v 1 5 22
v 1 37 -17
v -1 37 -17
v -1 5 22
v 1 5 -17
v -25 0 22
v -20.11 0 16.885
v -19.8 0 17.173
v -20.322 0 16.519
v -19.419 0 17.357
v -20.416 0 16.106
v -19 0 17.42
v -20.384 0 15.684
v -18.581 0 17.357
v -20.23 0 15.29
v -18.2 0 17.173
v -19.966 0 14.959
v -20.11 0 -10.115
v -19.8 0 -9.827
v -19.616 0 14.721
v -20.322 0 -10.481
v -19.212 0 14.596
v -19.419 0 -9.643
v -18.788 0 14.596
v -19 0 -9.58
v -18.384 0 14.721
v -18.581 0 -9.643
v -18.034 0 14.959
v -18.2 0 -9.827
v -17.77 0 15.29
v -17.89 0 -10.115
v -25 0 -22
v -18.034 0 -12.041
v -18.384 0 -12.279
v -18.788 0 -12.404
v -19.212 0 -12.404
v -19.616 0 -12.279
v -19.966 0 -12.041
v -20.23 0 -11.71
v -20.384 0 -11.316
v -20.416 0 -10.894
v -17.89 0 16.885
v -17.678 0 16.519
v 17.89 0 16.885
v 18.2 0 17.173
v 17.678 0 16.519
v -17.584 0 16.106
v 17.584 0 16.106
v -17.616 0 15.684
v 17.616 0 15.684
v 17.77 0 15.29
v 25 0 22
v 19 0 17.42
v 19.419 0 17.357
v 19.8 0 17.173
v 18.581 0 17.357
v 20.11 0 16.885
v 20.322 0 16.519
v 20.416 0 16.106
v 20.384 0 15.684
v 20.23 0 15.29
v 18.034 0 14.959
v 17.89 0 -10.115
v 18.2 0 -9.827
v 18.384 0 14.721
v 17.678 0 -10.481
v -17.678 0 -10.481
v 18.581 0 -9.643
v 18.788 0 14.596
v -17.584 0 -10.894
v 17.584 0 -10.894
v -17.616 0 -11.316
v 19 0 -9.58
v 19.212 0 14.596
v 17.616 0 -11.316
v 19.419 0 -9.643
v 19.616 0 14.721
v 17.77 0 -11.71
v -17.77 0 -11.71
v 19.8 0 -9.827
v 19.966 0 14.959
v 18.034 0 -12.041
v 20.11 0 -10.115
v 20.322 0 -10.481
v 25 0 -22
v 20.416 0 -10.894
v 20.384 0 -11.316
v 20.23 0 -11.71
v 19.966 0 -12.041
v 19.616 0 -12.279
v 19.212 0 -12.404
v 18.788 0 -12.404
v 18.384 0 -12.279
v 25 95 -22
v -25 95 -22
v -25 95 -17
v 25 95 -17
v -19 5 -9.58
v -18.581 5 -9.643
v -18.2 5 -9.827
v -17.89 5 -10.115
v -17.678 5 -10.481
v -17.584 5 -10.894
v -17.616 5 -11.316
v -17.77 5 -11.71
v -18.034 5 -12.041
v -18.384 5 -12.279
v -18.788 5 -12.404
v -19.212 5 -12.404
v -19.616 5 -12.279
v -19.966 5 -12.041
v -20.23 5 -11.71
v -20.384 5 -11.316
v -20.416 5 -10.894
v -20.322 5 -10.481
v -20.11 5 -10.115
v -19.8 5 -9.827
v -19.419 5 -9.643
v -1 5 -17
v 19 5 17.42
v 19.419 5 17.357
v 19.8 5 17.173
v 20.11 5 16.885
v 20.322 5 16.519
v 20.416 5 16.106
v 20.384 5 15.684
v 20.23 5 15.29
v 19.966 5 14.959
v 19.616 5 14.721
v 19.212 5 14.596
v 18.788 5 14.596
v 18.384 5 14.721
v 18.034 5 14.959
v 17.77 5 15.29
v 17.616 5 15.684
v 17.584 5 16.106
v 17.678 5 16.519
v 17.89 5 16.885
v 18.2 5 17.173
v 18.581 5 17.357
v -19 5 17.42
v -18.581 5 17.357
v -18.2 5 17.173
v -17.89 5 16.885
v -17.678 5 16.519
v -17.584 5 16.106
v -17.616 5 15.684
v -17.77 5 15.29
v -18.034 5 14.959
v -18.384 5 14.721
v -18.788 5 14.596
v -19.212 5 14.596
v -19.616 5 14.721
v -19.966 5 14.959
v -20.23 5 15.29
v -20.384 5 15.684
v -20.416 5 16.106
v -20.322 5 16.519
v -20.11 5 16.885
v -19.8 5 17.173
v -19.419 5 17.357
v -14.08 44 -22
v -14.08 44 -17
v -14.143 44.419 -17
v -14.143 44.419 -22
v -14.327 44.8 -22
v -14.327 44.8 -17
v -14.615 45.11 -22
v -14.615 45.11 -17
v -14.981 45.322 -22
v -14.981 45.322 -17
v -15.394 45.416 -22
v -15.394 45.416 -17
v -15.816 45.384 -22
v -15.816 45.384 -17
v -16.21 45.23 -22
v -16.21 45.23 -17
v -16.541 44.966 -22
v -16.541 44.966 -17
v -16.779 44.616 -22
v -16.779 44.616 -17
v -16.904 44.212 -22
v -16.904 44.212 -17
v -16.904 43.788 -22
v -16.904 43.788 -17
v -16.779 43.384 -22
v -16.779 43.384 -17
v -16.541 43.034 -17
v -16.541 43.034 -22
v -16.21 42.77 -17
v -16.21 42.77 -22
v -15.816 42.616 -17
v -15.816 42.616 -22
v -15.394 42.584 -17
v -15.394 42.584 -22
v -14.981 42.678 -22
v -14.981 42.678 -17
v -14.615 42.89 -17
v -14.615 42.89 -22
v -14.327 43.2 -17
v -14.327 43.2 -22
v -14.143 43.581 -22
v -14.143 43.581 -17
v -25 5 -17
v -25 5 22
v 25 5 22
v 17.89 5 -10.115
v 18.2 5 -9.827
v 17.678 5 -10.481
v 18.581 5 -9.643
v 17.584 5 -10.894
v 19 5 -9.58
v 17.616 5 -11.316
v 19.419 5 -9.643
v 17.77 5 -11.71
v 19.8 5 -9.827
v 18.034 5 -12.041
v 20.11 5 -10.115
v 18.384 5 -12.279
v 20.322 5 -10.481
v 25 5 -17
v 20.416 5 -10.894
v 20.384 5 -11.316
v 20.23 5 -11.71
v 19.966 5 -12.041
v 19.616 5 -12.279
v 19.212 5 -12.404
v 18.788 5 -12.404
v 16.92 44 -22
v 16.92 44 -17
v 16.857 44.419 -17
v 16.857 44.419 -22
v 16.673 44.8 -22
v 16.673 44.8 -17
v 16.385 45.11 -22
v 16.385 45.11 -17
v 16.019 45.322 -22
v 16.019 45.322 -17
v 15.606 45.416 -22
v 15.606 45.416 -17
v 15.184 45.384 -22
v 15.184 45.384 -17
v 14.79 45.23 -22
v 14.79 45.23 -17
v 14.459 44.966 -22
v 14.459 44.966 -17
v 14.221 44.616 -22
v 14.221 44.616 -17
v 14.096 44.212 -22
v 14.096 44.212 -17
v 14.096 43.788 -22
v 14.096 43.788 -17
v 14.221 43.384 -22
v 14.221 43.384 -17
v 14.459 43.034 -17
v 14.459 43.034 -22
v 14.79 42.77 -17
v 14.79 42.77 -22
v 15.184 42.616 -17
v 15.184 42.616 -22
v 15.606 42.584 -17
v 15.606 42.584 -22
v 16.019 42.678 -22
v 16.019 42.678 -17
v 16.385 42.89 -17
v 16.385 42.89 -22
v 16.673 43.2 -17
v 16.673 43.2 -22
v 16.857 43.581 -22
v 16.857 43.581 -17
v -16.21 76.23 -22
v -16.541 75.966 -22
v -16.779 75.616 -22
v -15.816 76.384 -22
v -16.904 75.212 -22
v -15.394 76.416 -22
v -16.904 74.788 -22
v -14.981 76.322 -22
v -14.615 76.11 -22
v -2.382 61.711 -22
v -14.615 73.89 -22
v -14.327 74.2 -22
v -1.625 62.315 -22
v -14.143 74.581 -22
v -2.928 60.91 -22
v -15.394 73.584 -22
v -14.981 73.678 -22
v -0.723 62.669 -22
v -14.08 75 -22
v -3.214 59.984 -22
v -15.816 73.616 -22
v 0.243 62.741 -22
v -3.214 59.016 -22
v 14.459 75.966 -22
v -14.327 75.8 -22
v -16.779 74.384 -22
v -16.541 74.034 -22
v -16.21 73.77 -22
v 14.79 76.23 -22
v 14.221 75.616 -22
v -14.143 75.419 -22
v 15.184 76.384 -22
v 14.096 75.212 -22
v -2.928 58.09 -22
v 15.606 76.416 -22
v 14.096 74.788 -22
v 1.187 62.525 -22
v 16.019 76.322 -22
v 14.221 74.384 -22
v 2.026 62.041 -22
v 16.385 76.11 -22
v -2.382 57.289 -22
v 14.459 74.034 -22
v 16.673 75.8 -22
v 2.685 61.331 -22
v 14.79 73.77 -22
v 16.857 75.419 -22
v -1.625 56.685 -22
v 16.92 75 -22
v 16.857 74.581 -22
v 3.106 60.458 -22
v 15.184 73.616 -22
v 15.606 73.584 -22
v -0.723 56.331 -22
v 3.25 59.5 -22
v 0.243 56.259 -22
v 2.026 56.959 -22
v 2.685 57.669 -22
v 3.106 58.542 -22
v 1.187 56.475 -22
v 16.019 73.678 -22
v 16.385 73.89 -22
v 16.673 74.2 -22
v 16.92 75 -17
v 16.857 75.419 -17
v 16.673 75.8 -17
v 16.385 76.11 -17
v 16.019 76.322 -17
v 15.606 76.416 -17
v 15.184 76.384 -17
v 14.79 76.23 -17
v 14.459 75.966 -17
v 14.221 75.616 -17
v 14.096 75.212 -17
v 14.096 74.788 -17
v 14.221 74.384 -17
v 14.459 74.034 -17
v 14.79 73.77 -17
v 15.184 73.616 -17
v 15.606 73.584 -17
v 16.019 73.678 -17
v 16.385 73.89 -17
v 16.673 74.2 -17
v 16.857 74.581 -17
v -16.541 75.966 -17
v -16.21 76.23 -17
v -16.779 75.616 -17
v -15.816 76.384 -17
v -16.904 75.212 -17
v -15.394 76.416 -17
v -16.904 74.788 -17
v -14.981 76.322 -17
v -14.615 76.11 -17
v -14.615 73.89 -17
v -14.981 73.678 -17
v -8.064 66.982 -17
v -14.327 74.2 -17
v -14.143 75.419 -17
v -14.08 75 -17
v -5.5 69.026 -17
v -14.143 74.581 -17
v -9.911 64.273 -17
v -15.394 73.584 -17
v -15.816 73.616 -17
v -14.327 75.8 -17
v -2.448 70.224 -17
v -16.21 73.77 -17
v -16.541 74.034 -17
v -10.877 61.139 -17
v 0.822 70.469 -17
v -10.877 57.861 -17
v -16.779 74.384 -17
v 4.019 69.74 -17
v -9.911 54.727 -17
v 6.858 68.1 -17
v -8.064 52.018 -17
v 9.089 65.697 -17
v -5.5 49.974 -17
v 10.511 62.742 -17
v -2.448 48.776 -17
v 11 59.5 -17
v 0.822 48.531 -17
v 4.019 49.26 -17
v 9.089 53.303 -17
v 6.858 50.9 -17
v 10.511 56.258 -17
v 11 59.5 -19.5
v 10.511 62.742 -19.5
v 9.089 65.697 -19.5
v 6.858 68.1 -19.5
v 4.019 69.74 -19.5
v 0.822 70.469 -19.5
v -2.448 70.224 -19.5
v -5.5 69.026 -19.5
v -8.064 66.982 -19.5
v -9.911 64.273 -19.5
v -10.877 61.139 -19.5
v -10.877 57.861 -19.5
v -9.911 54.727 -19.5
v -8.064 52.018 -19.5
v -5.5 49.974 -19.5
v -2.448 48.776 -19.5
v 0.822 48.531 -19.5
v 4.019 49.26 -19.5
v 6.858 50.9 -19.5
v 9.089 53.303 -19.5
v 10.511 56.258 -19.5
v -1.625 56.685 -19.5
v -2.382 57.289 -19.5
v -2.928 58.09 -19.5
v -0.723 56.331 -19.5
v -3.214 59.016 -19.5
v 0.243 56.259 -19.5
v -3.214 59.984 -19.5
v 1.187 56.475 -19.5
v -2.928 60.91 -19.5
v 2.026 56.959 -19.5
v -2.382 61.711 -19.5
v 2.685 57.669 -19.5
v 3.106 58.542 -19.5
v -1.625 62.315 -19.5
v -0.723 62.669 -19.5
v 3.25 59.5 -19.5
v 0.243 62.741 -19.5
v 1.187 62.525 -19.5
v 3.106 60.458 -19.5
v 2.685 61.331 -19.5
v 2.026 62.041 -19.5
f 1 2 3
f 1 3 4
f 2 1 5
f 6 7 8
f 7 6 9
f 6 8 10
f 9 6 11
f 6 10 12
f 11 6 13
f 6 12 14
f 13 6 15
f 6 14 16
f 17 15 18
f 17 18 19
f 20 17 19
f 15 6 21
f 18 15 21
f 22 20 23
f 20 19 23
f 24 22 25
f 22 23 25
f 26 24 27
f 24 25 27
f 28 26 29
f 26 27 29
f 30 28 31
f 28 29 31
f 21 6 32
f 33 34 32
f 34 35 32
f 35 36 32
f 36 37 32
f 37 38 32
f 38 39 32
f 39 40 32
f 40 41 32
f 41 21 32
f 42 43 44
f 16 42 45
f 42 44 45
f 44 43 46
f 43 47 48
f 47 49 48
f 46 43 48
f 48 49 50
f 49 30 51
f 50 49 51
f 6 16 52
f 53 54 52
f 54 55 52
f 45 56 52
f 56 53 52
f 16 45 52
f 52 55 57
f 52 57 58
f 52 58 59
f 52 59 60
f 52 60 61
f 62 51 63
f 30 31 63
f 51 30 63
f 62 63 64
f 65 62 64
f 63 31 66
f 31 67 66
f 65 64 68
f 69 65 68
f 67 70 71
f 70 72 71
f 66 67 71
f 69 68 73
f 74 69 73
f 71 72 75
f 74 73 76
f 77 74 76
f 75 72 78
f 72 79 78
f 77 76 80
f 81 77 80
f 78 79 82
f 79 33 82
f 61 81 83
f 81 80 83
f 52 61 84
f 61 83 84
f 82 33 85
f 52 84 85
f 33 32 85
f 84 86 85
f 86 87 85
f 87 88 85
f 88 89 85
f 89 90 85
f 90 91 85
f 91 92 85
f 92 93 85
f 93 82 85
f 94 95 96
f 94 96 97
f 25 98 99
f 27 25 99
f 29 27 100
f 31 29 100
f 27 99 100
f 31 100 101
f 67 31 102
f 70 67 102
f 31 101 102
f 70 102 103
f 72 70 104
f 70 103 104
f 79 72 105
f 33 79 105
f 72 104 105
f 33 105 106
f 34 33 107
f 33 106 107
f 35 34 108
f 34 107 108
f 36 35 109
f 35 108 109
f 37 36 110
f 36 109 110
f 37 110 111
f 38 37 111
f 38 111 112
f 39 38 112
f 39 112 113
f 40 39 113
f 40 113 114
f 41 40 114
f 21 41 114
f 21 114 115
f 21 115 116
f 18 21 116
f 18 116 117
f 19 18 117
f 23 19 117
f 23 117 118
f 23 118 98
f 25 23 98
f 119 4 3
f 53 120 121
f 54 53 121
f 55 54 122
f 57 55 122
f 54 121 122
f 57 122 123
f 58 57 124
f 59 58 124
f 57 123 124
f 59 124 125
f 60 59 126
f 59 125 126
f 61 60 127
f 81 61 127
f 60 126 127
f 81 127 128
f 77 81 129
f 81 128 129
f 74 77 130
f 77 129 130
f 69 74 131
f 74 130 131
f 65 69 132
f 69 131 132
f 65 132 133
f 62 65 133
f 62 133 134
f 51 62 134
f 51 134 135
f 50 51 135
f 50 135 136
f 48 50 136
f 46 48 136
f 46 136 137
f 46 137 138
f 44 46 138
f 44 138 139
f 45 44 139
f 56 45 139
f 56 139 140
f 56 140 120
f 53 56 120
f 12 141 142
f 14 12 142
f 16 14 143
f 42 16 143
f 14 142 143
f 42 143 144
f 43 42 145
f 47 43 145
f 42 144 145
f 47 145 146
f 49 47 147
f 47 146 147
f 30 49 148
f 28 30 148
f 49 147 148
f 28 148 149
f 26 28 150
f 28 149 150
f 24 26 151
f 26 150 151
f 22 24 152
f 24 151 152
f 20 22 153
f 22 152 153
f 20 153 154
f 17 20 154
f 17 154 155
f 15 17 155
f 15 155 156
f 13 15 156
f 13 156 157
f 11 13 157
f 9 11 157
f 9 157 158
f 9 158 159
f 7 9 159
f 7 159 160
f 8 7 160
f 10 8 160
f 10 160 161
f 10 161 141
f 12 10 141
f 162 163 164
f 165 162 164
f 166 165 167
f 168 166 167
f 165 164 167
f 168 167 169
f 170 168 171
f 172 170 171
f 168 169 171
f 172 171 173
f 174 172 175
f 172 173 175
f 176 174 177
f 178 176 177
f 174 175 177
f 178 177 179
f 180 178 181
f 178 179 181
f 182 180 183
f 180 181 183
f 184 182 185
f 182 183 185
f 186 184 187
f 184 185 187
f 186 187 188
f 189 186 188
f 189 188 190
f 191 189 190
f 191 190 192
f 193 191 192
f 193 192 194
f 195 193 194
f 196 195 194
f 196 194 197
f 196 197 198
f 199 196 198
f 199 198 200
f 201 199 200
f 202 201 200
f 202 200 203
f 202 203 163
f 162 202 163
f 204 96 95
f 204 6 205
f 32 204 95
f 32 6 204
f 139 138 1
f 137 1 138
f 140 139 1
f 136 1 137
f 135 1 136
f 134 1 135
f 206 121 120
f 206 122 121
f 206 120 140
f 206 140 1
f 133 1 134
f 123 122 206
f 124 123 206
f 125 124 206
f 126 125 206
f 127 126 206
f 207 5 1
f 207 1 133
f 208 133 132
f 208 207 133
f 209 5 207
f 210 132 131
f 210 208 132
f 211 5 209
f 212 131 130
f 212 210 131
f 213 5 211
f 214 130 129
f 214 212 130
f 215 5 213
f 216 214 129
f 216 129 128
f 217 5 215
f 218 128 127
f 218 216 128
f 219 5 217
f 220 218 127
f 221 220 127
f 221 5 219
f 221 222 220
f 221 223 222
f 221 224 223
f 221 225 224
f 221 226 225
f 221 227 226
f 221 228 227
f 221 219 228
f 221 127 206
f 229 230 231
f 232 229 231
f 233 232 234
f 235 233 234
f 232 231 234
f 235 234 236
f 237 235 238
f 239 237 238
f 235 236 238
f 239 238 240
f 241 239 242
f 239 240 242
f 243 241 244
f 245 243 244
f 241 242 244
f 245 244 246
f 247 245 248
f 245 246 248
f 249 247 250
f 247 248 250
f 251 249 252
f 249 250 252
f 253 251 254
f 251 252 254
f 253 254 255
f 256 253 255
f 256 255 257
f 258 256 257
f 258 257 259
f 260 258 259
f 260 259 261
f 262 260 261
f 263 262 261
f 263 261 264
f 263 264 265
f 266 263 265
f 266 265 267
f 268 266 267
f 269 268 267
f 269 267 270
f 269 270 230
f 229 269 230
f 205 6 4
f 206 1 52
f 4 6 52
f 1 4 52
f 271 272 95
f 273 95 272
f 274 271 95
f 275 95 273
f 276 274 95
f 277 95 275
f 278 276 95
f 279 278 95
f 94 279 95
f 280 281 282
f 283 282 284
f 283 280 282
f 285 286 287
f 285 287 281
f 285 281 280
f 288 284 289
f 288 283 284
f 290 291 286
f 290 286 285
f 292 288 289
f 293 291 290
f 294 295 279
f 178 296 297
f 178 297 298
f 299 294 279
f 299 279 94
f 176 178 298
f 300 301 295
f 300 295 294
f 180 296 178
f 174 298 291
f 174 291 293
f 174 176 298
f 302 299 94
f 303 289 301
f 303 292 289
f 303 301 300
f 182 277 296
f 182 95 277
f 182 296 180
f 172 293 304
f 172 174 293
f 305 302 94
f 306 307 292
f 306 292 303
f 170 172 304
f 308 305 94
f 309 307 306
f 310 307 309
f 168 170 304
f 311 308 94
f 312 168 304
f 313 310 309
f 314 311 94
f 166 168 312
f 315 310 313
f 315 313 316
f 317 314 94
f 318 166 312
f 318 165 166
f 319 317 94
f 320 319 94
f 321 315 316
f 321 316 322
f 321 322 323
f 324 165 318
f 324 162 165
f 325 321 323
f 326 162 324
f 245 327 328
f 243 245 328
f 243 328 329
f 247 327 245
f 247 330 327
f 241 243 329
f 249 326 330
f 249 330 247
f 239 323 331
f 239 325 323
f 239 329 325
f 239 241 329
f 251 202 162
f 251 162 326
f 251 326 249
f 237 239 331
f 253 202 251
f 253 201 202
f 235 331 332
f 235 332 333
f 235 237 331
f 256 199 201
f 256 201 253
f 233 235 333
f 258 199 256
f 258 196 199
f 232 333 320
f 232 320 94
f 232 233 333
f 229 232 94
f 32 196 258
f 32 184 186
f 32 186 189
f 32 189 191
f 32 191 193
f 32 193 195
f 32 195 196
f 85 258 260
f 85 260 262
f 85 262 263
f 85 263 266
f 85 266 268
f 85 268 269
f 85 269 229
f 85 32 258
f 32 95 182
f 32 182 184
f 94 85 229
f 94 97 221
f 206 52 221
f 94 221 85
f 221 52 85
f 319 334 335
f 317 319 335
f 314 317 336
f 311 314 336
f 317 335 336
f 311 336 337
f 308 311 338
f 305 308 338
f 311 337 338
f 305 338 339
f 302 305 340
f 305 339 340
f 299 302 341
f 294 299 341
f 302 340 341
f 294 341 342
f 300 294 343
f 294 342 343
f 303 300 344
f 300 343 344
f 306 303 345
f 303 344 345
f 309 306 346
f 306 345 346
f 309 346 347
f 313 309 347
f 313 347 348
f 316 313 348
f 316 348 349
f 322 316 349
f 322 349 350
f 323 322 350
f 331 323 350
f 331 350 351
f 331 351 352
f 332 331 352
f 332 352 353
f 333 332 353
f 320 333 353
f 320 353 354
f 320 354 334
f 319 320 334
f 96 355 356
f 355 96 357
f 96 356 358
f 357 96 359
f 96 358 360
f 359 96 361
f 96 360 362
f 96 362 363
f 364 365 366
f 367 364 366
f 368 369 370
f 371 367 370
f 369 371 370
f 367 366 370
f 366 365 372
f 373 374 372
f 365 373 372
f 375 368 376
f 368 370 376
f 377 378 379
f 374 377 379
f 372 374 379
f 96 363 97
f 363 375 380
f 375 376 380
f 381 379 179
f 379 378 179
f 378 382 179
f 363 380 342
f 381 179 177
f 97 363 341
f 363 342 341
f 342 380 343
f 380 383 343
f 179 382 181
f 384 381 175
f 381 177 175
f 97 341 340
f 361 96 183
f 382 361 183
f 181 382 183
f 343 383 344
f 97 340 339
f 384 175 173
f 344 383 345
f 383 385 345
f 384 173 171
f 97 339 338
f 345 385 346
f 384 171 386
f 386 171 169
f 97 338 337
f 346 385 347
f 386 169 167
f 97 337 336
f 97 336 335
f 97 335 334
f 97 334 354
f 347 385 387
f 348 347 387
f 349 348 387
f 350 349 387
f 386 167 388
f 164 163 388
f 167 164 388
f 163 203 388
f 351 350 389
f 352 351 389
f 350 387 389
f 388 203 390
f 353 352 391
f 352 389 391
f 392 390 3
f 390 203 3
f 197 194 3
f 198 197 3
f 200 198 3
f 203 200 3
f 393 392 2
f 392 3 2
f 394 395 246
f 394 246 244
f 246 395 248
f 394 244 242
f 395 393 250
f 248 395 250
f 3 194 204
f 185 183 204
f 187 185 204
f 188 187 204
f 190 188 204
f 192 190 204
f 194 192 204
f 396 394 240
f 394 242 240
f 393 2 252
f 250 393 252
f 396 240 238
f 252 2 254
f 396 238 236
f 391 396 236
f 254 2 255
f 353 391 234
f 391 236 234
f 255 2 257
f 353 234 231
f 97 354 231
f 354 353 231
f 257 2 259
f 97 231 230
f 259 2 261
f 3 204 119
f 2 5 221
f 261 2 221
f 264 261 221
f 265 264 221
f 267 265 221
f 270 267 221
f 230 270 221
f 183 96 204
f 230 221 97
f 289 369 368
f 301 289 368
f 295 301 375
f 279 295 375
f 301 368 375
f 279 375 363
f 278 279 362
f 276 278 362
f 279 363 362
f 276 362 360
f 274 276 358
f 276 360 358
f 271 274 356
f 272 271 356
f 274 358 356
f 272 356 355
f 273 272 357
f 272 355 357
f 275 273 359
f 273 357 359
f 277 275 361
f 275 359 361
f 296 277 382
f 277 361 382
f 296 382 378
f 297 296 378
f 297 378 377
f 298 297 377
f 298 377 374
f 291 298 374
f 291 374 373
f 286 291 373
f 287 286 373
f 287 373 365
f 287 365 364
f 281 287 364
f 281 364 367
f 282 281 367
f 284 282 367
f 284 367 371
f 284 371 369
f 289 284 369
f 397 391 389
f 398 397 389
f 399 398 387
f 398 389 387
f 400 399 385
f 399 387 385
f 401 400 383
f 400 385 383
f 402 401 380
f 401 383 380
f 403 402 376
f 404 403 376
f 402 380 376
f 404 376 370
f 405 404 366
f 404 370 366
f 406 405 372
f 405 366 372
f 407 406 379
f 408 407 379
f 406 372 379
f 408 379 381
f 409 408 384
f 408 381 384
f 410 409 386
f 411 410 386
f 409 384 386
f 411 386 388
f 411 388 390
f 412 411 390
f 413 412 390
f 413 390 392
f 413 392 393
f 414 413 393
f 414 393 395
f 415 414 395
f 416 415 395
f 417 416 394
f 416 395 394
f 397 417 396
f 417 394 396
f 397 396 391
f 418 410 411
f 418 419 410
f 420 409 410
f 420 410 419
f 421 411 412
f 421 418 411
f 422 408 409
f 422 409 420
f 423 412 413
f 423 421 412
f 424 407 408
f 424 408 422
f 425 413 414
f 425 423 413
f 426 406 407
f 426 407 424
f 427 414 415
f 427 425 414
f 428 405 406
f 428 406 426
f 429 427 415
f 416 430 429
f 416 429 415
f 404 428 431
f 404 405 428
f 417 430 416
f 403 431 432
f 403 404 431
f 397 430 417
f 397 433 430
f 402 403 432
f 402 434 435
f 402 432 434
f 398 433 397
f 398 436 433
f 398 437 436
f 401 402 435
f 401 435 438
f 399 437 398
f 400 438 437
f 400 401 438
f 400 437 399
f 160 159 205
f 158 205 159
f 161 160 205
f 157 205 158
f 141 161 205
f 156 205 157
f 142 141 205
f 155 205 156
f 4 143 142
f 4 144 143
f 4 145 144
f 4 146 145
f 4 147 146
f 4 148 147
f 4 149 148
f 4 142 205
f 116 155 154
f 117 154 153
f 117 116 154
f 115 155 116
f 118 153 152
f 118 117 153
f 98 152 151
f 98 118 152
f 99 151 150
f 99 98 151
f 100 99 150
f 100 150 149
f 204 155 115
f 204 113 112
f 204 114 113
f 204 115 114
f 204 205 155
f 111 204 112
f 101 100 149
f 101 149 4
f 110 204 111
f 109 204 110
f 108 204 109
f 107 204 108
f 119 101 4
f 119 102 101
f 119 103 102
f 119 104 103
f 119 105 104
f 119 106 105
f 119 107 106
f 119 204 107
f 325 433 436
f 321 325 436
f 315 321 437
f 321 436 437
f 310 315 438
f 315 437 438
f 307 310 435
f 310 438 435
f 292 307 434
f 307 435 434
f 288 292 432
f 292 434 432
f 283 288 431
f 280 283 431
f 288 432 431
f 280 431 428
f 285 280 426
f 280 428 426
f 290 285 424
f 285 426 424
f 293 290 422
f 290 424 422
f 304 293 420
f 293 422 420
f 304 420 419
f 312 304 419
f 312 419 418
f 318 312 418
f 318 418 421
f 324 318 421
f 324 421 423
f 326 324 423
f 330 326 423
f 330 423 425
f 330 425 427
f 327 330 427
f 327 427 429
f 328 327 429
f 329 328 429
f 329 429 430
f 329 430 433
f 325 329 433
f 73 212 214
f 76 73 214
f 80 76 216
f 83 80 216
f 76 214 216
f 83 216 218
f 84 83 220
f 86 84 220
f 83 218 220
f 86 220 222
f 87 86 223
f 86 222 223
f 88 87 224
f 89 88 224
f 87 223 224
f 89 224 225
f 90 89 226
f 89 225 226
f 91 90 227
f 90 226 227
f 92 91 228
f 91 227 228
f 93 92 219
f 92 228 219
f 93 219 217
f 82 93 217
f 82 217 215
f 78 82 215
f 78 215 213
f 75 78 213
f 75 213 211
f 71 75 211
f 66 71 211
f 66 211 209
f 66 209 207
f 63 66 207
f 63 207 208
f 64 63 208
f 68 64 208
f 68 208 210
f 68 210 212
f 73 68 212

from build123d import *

# Parameters (mm, degrees)
SKETCH1_W           = 50
SKETCH1_H           = 44
BOSS_EXTRUDE1_DEPTH = 5
SKETCH2_W           = 50
SKETCH2_H           = 5
BOSS_EXTRUDE2_DEPTH = 90
SKETCH3_R           = 1.42
CUT_EXTRUDE1_DEPTH  = 60
SKETCH4_R           = 11
CUT_EXTRUDE2_DEPTH  = 2.5
SKETCH5_R           = 3.25
CUT_EXTRUDE3_DEPTH  = 10
SKETCH6_R           = 1.42
CUT_EXTRUDE4_DEPTH  = 10
SKETCH8_W           = 2
SKETCH8_H           = 39
BOSS_EXTRUDE3_DEPTH = 32
CUT_EXTRUDE5_DEPTH  = 35


with BuildPart() as part:
    # Sketch1 → Boss-Extrude1 (new body)
    with BuildSketch(Plane(origin=(0, 0, 0), x_dir=(1, 0, 0), z_dir=(0, 1, 0))):
        Rectangle(SKETCH1_W, SKETCH1_H)
    extrude(amount=BOSS_EXTRUDE1_DEPTH)

    # Sketch2 → Boss-Extrude2 (add)
    with BuildSketch(Plane(origin=(0, 5, 0), x_dir=(1, 0, 0), z_dir=(0, 1, 0))):
        with Locations((0, 19.5)):
            Rectangle(SKETCH2_W, SKETCH2_H)
    extrude(amount=BOSS_EXTRUDE2_DEPTH)

    # Sketch3 → Cut-Extrude1 (cut)
    with BuildSketch(Plane.XY.offset(-17)):
        with Locations((-15.5, 44)):
            Circle(SKETCH3_R)
        with Locations((15.5, 44)):
            Circle(SKETCH3_R)
        with Locations((15.5, 75)):
            Circle(SKETCH3_R)
        with Locations((-15.5, 75)):
            Circle(SKETCH3_R)
    extrude(amount=-CUT_EXTRUDE1_DEPTH, mode=Mode.SUBTRACT)

    # Sketch4 → Cut-Extrude2 (cut)
    with BuildSketch(Plane.XY.offset(-17)):
        with Locations((0, 59.5)):
            Circle(SKETCH4_R)
    extrude(amount=-CUT_EXTRUDE2_DEPTH, mode=Mode.SUBTRACT)

    # Sketch5 → Cut-Extrude3 (cut)
    with BuildSketch(Plane.XY.offset(-19.5)):
        with Locations((0, 59.5)):
            Circle(SKETCH5_R)
    extrude(amount=-CUT_EXTRUDE3_DEPTH, mode=Mode.SUBTRACT)

    # Sketch6 → Cut-Extrude4 (cut)
    with BuildSketch(Plane(origin=(0, 5, 0), x_dir=(1, 0, 0), z_dir=(0, 1, 0))):
        with Locations(Location((-19, 11, 0), (0, 0, 270))):
            Circle(SKETCH6_R)
        with Locations(Location((-19, -16, 0), (0, 0, 270))):
            Circle(SKETCH6_R)
        with Locations(Location((19, -16, 0), (0, 0, 270))):
            Circle(SKETCH6_R)
        with Locations(Location((19, 11, 0), (0, 0, 270))):
            Circle(SKETCH6_R)
    extrude(amount=-CUT_EXTRUDE4_DEPTH, mode=Mode.SUBTRACT)

    # Sketch8 → Boss-Extrude3 (add)
    with BuildSketch(Plane(origin=(0, 5, 0), x_dir=(1, 0, 0), z_dir=(0, 1, 0))):
        with Locations((0, -2.5)):
            Rectangle(SKETCH8_W, SKETCH8_H)
    extrude(amount=BOSS_EXTRUDE3_DEPTH)

    # Sketch9 → Cut-Extrude5 (cut)
    with BuildSketch(Plane(origin=(1, 0, 0), x_dir=(0, 0, -1), z_dir=(1, 0, 0))):
        Polygon((17, 37), (-22, 5), (-22, 37), align=None)
    extrude(amount=-CUT_EXTRUDE5_DEPTH, mode=Mode.SUBTRACT)


solid = part.part
